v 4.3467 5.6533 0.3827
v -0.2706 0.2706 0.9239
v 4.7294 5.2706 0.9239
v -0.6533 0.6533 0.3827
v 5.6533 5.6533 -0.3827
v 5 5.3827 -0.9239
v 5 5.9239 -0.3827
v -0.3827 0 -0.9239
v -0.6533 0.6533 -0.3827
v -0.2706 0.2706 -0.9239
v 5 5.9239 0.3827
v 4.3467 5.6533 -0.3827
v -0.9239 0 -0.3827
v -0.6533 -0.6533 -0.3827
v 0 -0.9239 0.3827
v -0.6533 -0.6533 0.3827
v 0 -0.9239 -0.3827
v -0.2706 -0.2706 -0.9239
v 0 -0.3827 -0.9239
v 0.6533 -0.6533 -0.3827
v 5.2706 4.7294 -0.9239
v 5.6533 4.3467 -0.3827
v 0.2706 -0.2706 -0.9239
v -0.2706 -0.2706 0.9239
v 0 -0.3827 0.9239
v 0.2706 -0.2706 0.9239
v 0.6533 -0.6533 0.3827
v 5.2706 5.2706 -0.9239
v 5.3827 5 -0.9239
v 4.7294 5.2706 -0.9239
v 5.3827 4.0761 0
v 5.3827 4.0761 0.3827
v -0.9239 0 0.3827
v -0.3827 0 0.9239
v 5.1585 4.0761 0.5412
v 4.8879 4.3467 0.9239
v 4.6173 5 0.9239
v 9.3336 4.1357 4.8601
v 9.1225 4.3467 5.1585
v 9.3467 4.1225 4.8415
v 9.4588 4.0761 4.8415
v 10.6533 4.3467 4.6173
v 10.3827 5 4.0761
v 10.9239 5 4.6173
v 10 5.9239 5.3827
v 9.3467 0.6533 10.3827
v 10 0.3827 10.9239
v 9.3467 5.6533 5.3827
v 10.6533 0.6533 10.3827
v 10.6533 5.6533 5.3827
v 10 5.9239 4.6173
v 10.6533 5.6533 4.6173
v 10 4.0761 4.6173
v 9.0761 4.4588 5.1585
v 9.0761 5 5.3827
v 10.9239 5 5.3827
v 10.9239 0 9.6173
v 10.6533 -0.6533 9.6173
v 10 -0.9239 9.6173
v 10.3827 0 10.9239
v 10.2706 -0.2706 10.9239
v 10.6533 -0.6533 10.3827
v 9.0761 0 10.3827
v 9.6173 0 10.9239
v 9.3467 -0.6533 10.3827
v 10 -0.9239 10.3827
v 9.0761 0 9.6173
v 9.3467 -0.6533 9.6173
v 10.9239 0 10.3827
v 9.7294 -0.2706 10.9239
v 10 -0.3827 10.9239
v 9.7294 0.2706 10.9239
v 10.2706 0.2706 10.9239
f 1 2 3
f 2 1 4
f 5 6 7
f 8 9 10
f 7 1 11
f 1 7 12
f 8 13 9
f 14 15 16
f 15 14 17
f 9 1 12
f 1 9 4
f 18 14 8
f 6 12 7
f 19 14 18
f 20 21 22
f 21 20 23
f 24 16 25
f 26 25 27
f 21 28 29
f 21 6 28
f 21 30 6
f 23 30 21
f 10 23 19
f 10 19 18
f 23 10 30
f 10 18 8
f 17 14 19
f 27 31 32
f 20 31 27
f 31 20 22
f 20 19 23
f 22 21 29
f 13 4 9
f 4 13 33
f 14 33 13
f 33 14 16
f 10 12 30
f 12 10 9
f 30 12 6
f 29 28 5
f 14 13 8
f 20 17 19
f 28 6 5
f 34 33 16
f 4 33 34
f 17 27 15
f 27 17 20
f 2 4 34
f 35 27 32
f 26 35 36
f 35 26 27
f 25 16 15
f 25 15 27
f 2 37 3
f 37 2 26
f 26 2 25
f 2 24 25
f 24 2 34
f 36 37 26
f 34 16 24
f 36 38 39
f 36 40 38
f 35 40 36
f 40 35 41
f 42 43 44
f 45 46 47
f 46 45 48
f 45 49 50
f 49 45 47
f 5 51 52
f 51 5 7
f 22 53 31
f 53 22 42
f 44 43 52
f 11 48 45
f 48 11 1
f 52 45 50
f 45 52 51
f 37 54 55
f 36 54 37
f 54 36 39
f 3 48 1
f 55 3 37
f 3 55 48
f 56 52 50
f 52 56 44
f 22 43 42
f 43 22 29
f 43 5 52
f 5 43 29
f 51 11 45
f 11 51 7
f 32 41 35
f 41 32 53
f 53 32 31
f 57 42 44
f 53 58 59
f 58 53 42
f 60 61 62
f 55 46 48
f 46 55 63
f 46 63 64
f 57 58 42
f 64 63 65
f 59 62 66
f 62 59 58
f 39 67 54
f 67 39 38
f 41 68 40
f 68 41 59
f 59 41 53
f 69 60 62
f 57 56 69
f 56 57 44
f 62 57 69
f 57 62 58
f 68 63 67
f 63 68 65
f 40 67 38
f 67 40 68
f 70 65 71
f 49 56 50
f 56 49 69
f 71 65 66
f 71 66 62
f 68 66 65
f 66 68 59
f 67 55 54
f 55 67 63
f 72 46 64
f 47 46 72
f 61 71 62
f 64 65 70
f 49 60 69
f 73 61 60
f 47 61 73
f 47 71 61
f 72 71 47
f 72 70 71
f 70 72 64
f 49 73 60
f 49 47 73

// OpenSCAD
// Generated by scadwright. Do not hand-edit —
// edit the Python source and regenerate.

$fn = 8;

union() {
    hull() {
        translate([0, 0, 0]) {
            sphere(r=1);
        }
        translate([5, 5, 0]) {
            sphere(r=1);
        }
    }

    hull() {
        translate([5, 5, 0]) {
            sphere(r=1);
        }
        translate([10, 5, 5]) {
            sphere(r=1);
        }
    }

    hull() {
        translate([10, 5, 5]) {
            sphere(r=1);
        }
        translate([10, 0, 10]) {
            sphere(r=1);
        }
    }
}
